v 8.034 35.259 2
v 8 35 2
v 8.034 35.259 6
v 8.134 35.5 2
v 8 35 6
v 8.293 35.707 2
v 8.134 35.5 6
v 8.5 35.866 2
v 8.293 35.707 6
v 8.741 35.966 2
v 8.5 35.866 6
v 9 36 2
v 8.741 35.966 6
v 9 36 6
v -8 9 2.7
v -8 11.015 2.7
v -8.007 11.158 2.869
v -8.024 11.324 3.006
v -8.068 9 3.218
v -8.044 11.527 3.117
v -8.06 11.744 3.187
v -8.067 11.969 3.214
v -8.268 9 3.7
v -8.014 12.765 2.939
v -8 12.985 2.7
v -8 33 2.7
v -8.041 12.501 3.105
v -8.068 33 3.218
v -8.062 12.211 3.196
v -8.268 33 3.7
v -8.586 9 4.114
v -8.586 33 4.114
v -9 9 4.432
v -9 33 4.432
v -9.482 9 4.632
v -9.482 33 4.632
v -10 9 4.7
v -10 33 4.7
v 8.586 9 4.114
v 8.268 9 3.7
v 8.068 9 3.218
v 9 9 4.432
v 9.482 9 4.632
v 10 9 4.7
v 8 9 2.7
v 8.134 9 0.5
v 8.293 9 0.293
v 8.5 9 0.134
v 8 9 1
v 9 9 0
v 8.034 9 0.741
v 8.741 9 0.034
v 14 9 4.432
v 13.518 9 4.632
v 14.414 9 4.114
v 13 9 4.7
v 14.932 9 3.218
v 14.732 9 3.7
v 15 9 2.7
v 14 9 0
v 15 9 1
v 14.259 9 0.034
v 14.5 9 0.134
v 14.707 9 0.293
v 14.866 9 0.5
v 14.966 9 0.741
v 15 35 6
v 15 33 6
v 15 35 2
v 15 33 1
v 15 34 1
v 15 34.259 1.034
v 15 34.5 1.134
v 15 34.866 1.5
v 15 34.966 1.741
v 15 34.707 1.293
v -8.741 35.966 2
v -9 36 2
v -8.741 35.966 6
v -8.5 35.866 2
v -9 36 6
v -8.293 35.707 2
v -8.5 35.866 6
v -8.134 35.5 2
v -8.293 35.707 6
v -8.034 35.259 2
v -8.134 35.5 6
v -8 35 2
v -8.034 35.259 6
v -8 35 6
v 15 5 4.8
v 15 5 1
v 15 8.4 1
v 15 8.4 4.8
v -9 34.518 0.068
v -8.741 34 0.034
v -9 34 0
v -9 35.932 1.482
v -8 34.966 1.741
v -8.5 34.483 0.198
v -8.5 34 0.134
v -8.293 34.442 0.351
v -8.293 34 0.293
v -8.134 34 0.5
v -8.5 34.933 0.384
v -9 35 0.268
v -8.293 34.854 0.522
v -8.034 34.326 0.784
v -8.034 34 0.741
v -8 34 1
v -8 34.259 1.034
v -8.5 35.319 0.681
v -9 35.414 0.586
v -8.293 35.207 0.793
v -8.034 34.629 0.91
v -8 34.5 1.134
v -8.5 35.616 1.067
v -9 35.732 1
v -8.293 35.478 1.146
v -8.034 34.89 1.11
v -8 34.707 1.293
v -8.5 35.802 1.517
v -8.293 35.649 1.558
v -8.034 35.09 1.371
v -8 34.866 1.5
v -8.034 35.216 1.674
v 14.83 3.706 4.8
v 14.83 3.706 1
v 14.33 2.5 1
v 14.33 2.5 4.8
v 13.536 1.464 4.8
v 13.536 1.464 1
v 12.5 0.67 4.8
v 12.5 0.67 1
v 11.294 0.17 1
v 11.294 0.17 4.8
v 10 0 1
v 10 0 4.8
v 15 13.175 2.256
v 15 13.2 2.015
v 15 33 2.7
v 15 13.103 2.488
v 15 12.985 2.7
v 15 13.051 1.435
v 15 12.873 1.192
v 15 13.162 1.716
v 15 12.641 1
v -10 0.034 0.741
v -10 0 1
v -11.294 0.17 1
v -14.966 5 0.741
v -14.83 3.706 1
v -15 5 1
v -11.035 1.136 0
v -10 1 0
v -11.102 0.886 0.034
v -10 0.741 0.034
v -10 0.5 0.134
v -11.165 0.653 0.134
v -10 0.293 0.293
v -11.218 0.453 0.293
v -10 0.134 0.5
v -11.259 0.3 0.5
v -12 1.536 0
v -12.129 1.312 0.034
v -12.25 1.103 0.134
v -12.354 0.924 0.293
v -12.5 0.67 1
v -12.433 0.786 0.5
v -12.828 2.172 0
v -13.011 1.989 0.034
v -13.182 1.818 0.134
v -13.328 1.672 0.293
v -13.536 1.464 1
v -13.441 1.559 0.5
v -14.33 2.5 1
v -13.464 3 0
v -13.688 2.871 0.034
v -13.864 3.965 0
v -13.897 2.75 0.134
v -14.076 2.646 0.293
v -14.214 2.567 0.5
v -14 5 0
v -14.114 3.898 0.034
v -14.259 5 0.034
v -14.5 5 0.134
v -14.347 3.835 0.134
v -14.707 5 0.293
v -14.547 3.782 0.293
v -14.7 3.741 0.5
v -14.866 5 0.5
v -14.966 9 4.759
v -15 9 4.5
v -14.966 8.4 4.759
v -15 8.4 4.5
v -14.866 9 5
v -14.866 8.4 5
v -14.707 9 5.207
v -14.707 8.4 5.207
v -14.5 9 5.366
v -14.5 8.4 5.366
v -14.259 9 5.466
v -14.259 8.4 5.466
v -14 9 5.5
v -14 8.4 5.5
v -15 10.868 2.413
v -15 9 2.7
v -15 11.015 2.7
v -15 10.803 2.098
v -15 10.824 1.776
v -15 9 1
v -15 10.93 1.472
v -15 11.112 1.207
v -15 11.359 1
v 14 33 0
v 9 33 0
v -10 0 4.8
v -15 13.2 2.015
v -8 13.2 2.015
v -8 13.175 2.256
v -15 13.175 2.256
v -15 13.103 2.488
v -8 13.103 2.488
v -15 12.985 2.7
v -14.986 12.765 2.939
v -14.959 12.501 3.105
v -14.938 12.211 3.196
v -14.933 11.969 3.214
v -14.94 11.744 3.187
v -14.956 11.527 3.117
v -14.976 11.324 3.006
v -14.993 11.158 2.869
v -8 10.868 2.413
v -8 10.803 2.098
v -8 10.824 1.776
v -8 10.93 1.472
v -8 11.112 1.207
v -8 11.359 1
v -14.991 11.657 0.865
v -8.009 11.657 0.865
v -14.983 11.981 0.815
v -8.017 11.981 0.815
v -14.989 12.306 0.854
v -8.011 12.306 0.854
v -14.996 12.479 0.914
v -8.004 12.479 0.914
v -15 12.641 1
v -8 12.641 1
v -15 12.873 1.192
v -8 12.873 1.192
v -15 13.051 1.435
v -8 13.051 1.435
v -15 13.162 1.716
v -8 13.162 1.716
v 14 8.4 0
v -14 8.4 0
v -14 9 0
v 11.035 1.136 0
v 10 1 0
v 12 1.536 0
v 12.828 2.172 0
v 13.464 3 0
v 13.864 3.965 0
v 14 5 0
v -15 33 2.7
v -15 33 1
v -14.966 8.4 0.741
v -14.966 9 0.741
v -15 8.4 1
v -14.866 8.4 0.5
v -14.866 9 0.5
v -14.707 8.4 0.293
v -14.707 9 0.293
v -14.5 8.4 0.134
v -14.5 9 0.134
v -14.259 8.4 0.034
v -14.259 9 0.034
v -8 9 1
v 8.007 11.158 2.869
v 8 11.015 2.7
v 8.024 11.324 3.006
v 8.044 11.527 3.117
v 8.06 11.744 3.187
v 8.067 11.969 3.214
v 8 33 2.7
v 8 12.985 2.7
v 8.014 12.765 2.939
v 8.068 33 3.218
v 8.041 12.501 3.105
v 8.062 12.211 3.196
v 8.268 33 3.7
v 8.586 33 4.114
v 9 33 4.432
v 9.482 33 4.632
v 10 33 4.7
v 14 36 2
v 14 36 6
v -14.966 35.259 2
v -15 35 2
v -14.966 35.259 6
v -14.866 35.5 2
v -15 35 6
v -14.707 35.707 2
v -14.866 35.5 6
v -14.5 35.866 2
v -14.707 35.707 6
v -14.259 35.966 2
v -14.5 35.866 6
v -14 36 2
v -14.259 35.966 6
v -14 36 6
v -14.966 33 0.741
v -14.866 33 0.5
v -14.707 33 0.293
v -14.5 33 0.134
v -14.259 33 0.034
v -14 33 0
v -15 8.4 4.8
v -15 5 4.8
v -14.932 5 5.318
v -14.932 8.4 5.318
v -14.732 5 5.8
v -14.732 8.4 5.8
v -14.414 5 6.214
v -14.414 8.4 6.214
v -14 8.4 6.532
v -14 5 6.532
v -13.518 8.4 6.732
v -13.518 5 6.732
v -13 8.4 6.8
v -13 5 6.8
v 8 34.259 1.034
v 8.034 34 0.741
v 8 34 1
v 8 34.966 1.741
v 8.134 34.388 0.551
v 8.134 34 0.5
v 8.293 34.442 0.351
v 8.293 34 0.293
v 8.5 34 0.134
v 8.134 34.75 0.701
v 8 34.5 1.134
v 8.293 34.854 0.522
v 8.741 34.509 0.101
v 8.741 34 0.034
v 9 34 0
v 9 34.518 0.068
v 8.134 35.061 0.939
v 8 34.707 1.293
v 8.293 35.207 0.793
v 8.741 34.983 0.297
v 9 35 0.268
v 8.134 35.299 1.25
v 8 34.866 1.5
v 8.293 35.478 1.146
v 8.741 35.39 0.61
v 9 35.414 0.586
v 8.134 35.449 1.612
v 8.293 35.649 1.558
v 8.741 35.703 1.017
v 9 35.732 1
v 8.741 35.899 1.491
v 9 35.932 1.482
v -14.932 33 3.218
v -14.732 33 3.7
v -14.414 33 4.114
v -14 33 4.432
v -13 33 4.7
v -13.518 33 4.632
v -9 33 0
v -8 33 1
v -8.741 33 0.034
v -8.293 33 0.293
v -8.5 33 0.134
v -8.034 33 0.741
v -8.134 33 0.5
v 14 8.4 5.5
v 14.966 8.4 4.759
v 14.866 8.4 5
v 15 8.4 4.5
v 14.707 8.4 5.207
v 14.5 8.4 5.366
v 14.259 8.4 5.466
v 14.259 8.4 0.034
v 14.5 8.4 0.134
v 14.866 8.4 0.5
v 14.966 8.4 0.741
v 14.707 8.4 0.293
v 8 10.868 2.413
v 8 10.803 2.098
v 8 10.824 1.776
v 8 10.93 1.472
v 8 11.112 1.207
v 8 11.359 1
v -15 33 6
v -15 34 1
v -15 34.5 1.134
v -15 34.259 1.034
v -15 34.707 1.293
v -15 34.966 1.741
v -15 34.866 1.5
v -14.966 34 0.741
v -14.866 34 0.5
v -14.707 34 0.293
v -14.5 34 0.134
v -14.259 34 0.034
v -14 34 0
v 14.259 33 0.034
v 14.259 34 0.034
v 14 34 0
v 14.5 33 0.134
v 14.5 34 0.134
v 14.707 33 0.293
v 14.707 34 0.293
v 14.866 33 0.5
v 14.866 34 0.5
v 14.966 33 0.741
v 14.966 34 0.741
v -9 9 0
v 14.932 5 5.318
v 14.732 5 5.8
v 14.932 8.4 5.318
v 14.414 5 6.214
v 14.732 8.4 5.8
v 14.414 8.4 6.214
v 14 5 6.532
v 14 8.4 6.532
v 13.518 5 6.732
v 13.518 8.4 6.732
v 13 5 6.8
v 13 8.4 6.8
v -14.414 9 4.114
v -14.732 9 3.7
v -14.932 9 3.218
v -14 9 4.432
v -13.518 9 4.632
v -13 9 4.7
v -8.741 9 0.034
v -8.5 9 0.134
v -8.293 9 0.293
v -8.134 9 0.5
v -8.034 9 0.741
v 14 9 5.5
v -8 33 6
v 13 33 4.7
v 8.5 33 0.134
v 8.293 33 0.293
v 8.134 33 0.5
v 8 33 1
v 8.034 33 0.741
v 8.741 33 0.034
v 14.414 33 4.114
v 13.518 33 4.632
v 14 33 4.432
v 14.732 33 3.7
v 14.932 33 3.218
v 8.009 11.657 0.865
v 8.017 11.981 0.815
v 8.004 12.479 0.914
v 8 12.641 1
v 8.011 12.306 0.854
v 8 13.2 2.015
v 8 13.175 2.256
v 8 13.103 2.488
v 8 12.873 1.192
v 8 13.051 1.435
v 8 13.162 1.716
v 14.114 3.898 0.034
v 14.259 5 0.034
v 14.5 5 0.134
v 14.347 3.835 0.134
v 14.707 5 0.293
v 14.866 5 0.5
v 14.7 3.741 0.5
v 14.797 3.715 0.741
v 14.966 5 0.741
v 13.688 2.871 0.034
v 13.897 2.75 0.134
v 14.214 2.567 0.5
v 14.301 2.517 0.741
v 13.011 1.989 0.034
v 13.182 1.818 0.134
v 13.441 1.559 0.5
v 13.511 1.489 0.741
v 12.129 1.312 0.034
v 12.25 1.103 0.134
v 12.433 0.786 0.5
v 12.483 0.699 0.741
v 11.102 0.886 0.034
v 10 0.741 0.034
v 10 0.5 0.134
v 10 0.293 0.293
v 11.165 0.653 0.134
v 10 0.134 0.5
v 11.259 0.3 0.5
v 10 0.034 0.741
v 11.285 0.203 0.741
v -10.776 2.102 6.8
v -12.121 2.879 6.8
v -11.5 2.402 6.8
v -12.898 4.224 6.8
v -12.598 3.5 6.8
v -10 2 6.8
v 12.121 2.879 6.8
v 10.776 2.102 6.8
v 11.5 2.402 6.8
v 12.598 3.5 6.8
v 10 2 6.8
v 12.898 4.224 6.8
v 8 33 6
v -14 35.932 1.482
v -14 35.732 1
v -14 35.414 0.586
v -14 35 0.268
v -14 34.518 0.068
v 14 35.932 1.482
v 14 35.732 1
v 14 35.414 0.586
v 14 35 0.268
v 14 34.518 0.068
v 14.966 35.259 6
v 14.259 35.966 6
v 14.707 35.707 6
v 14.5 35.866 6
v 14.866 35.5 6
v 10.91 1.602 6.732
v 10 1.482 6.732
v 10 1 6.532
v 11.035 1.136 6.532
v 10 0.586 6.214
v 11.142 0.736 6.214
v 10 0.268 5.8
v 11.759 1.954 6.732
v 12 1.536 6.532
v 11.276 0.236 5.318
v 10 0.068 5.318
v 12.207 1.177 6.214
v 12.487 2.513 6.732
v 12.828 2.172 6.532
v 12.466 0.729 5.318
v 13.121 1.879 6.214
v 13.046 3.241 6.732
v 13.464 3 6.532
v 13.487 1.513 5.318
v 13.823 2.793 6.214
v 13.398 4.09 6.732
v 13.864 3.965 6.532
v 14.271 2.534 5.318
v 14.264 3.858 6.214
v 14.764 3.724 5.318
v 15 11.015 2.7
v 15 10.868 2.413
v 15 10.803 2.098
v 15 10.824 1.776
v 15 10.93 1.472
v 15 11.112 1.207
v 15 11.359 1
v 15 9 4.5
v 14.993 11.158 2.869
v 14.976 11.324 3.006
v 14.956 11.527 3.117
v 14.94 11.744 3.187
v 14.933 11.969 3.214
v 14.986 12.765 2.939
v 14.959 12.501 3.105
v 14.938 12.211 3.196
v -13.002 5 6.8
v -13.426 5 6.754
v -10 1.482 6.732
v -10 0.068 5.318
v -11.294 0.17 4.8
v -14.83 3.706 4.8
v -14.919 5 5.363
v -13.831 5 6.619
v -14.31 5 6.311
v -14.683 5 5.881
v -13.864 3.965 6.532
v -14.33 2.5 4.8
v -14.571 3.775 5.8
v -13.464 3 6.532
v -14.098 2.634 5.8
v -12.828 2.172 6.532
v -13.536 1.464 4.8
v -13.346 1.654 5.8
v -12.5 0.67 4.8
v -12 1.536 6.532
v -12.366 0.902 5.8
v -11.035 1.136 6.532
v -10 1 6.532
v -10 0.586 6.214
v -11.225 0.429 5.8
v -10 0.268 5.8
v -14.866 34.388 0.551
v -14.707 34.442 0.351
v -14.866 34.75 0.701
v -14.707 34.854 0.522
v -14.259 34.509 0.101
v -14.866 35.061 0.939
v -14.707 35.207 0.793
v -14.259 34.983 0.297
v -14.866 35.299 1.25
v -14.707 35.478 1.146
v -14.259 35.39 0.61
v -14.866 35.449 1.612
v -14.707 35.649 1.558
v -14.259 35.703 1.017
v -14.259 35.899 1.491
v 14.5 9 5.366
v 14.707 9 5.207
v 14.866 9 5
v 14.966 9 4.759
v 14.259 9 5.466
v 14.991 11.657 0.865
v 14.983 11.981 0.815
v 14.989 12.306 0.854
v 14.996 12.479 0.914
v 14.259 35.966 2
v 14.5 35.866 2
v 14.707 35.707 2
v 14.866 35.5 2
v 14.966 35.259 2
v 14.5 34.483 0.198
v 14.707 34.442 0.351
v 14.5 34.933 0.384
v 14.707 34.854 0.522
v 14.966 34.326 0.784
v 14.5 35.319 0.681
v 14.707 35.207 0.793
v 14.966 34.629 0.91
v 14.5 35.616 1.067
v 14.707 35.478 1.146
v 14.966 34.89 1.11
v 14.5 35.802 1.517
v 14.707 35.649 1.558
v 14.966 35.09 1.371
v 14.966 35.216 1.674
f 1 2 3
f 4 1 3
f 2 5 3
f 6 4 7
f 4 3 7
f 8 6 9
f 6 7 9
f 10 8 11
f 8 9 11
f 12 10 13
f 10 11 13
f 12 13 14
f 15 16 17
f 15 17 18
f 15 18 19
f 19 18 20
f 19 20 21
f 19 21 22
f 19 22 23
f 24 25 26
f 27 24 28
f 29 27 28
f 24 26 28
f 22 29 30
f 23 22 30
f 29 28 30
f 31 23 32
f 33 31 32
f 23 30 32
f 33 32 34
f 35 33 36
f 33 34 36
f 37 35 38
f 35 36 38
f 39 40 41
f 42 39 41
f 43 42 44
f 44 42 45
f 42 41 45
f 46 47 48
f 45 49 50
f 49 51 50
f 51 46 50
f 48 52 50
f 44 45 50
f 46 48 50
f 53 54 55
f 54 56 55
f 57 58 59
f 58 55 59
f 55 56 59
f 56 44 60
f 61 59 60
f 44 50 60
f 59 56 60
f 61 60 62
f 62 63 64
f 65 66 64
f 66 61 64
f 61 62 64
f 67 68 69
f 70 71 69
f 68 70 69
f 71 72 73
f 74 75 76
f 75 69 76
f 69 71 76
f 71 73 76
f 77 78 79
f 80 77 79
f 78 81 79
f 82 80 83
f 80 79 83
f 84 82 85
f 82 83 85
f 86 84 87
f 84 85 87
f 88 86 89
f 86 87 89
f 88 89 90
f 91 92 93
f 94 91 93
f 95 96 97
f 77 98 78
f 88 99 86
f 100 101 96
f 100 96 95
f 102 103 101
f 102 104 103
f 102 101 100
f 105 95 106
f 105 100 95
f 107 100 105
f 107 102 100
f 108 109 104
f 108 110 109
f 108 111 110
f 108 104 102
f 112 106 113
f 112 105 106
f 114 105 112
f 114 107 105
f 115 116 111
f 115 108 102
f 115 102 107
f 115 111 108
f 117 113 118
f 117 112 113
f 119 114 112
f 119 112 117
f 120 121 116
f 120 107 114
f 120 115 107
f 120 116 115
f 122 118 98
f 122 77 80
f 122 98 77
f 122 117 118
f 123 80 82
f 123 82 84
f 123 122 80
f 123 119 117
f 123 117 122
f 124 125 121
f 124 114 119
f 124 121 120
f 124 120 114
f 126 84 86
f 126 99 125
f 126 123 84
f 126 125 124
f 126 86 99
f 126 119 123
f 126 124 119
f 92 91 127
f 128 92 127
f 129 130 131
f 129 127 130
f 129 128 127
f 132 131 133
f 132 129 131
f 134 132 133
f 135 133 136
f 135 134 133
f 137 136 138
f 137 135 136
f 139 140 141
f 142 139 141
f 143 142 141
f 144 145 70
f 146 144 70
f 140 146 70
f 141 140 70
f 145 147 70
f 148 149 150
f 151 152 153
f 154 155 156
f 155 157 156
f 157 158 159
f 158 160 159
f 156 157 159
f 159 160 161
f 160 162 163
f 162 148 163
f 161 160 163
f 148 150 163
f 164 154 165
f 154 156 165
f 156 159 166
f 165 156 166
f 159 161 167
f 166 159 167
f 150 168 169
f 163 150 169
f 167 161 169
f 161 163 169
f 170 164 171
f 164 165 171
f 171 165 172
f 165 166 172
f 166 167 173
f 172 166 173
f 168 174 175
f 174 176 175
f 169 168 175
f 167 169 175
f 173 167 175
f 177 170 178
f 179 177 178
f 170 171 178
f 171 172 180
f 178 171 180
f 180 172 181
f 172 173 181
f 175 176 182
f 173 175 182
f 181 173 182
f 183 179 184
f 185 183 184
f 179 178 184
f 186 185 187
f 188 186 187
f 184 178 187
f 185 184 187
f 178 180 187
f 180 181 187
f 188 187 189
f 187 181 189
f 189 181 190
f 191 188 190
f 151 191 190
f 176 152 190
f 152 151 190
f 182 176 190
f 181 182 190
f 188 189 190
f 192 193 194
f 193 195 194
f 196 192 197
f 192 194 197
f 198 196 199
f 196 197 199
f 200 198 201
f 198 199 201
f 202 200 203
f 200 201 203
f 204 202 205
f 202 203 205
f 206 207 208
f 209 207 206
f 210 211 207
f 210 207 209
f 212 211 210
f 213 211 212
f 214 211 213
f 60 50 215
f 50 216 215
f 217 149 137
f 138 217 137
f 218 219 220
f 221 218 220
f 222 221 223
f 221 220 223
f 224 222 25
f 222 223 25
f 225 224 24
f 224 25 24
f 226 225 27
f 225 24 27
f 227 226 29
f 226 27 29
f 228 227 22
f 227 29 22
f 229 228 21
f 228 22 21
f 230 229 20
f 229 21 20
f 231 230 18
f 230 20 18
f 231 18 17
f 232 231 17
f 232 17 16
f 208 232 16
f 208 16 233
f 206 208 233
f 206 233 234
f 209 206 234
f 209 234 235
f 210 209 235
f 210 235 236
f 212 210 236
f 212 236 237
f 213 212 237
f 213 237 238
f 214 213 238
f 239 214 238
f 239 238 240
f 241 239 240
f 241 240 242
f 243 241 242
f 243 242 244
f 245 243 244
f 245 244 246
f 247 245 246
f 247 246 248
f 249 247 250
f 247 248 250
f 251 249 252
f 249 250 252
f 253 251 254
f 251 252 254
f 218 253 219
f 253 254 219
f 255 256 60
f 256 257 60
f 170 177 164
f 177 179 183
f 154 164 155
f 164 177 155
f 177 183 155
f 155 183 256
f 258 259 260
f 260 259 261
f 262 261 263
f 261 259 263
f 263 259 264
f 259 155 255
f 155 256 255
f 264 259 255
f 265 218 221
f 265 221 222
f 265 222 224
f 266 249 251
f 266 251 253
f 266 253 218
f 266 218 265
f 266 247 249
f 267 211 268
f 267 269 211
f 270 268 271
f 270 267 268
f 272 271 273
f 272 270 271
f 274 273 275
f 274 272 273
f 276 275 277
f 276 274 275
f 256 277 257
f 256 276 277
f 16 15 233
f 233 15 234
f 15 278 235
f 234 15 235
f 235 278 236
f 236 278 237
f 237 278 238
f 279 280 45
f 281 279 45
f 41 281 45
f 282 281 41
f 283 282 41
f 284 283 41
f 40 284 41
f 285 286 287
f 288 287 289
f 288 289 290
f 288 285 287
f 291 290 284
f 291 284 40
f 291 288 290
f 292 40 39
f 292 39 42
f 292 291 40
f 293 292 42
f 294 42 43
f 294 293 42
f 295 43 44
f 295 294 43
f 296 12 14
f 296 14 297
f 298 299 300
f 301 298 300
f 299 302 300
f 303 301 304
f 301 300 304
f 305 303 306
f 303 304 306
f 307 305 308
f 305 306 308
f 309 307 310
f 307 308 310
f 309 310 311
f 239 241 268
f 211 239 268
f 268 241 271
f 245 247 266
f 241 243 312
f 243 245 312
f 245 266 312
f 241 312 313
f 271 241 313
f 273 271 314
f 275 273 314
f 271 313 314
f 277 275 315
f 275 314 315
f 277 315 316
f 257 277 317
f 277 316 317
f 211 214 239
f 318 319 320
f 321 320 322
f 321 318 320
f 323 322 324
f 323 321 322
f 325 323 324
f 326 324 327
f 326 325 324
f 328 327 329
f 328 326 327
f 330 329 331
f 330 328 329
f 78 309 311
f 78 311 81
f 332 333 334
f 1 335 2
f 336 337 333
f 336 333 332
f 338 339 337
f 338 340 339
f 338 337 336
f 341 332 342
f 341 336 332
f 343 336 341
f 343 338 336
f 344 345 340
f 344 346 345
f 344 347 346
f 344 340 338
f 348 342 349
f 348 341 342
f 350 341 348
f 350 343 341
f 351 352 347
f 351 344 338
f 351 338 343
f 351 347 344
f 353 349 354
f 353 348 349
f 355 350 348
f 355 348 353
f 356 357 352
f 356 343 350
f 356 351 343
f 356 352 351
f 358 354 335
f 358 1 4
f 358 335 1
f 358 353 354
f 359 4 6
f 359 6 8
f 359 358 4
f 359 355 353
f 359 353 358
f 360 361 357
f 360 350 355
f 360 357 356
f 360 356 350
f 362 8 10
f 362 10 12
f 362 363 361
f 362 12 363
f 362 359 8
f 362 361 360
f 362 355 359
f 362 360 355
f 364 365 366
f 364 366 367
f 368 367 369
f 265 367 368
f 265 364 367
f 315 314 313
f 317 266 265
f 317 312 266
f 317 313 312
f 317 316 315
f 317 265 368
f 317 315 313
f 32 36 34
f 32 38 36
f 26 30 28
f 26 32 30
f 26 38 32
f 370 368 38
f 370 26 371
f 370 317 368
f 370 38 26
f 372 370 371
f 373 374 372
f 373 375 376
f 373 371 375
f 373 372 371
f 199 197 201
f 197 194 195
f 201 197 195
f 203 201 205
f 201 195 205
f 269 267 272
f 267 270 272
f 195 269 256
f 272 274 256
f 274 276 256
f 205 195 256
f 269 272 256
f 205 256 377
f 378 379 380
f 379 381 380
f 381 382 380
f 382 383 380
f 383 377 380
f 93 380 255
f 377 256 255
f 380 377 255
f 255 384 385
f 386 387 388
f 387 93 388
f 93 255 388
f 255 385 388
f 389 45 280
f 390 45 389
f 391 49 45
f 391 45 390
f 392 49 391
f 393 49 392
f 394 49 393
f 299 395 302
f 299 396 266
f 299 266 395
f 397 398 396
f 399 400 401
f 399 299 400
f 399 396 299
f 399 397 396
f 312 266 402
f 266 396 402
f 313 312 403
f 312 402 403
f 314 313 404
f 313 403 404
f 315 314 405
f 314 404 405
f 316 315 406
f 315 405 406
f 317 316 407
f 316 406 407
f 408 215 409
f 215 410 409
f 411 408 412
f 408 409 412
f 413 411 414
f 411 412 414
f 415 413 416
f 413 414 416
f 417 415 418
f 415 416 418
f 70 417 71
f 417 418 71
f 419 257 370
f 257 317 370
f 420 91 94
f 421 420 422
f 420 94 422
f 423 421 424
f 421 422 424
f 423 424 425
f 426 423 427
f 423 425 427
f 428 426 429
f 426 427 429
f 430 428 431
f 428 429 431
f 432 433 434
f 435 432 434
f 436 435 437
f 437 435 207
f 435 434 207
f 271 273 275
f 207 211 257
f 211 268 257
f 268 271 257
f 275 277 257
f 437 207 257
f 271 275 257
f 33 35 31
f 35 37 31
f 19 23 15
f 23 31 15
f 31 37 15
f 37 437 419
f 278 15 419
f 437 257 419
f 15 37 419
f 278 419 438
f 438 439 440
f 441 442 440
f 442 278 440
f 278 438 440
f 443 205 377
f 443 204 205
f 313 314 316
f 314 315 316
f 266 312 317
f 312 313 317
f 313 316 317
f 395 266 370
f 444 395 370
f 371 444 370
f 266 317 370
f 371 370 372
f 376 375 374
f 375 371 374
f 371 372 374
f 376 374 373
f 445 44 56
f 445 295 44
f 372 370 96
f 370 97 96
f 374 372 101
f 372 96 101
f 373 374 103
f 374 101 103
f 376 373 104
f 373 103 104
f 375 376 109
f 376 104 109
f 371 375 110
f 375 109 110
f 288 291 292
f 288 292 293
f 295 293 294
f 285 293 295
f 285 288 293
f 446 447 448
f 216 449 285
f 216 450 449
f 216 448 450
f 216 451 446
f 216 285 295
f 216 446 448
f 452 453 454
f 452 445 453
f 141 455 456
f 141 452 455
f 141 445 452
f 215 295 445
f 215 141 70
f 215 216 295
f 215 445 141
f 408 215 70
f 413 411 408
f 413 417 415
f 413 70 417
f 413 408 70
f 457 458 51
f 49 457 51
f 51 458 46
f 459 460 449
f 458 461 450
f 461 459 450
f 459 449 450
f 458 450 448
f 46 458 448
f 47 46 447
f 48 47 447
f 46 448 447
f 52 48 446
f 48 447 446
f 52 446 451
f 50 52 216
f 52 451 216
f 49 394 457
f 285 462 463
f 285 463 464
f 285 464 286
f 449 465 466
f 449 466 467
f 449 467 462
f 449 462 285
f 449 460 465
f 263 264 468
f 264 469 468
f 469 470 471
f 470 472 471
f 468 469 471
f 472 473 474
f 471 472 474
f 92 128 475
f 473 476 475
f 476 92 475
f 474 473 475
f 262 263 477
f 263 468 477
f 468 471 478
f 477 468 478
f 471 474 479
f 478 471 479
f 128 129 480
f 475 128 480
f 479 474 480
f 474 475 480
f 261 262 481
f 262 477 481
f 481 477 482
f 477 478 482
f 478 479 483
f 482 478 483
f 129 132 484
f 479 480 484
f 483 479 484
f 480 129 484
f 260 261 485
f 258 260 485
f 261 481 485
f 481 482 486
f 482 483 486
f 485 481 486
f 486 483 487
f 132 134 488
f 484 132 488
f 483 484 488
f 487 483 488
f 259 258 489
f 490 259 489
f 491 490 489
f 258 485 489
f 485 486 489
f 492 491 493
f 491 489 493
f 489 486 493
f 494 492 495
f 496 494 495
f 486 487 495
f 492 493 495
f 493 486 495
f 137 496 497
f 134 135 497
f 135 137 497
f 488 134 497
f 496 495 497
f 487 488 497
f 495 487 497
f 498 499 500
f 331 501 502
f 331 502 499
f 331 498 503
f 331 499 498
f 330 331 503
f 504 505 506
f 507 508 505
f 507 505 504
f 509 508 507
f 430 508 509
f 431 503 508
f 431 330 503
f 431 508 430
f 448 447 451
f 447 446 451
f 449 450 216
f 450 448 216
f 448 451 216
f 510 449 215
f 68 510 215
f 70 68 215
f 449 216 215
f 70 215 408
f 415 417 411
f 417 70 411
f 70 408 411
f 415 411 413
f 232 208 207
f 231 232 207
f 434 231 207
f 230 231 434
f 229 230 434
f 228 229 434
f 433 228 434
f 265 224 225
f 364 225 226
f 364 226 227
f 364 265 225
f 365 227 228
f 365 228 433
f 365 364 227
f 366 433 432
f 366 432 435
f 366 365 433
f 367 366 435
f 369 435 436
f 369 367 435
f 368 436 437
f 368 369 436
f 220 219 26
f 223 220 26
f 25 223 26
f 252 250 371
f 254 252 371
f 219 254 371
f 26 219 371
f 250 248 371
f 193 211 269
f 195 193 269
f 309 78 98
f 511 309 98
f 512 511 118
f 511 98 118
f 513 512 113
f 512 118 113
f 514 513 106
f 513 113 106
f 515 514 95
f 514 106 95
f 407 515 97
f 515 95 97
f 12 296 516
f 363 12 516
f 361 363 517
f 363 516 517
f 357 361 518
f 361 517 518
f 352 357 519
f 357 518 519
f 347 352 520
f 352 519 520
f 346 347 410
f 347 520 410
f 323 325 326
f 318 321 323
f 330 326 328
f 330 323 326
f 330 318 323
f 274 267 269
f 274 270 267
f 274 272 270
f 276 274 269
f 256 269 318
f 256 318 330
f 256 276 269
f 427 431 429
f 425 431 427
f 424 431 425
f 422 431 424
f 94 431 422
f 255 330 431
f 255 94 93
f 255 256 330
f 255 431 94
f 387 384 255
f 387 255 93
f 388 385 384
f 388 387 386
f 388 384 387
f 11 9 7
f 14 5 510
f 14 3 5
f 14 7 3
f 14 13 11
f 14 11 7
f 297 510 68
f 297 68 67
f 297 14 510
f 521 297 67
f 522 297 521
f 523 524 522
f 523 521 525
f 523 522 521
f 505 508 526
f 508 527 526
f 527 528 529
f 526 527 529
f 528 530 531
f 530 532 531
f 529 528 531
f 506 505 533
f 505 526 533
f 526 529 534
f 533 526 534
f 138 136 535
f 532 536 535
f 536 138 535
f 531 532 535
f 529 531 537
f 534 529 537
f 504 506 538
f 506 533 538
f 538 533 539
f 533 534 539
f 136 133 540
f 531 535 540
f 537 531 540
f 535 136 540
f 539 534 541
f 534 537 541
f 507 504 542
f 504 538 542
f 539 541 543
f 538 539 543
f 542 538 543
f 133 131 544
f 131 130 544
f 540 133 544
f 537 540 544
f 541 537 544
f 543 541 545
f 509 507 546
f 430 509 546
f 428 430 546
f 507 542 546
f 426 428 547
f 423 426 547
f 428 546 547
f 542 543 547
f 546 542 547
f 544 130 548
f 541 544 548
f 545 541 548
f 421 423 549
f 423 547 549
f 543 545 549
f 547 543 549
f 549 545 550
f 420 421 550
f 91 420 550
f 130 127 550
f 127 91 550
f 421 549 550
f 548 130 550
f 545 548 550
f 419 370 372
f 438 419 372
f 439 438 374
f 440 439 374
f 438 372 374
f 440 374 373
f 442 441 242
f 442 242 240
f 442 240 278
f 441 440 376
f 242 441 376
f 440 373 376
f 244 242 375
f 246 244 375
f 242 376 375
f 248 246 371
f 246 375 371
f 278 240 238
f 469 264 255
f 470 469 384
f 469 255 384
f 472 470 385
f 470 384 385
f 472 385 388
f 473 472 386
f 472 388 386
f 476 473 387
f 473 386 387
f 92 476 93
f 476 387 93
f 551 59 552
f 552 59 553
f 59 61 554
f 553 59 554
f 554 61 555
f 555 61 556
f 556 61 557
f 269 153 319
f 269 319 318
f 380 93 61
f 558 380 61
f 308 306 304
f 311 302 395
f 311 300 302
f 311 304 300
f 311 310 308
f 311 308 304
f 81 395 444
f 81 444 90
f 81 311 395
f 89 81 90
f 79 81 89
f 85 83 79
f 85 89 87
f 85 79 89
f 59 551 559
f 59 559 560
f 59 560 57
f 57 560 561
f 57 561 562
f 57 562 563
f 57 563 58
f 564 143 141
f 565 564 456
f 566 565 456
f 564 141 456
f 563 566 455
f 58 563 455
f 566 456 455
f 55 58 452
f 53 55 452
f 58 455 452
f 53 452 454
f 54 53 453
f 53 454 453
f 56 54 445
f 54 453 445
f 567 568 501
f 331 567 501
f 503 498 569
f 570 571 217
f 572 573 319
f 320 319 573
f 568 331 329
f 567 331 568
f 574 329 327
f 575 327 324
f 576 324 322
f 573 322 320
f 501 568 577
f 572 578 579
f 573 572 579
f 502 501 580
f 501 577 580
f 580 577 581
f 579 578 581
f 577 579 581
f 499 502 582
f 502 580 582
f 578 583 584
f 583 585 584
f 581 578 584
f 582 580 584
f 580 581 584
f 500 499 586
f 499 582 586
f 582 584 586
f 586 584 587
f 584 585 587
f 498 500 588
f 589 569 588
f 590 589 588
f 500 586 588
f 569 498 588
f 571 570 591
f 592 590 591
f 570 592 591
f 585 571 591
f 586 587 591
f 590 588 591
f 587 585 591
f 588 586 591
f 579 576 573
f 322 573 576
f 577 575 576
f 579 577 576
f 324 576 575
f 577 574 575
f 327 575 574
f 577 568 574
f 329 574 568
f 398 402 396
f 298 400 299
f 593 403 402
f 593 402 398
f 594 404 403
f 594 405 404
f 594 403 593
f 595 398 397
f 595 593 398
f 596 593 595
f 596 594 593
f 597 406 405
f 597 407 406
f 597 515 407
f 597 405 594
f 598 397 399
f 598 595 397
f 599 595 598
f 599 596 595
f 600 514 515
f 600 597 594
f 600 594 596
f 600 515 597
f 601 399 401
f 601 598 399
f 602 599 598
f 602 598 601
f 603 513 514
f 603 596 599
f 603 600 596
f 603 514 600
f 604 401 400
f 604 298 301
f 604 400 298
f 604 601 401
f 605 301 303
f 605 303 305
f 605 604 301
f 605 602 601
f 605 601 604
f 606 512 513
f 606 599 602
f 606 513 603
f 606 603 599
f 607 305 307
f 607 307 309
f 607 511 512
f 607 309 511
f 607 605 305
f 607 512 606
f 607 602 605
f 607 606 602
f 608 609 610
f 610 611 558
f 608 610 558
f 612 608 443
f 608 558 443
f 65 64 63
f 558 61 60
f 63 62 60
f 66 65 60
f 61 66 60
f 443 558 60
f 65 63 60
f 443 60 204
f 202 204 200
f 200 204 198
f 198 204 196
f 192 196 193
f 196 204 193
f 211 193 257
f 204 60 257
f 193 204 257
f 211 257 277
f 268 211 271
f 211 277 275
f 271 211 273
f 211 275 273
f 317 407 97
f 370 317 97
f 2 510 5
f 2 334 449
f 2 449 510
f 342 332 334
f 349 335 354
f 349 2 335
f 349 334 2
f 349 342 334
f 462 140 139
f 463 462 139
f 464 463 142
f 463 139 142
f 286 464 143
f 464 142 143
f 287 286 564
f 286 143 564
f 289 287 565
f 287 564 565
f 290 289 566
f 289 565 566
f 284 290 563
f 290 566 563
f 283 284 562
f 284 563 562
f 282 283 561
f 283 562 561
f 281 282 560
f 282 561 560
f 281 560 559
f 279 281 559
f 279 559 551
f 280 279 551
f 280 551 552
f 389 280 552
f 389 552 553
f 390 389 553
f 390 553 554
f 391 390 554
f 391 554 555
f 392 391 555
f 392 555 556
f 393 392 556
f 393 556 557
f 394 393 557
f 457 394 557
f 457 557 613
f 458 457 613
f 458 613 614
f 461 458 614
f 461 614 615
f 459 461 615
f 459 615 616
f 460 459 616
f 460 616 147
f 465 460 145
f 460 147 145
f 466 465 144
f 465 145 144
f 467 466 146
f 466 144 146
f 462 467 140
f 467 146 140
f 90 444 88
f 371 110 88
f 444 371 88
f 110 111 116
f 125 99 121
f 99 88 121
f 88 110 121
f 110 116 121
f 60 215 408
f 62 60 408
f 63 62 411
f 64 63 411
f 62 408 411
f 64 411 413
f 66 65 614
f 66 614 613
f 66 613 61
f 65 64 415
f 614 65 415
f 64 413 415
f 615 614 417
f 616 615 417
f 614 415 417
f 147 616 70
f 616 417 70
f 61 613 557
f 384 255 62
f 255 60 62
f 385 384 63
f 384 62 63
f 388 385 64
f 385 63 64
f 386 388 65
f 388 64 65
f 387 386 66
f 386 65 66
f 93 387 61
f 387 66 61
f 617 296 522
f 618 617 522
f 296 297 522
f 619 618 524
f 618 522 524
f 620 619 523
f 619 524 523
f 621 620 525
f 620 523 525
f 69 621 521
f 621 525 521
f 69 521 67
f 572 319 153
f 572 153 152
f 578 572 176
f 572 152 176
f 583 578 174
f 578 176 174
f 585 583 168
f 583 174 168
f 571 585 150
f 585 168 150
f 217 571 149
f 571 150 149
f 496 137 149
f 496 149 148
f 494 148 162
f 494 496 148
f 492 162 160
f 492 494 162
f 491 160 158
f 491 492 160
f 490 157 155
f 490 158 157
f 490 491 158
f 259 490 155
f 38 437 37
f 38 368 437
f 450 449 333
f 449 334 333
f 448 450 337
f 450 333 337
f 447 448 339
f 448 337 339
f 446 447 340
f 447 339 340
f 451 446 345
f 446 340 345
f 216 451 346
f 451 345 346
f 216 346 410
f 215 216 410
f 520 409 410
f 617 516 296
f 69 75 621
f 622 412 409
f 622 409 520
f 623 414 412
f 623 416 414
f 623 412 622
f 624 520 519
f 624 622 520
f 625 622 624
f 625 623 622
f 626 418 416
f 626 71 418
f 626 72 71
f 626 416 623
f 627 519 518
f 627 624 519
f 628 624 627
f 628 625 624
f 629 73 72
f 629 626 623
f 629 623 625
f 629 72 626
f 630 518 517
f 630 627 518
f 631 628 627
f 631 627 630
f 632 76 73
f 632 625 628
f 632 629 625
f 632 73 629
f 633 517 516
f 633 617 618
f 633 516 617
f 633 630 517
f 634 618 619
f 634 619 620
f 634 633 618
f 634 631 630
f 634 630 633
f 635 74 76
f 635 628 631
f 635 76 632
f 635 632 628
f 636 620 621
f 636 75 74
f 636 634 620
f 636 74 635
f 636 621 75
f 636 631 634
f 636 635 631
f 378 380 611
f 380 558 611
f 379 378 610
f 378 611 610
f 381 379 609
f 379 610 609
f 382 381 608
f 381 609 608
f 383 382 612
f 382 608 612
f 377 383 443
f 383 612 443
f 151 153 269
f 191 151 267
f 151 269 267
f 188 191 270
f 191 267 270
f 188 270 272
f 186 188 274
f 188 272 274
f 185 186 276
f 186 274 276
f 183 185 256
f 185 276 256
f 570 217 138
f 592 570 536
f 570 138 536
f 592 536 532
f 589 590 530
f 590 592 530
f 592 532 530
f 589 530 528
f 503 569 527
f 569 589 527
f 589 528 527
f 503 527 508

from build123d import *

# Parameters (mm, degrees)
F0_W         = 30
F0_H         = 8.4
F1_DEPTH     = 6.8
F0_W_2       = 7
F0_H_2       = 24
F2_DEPTH     = 4.7
F0_H_3       = 3
F3_DEPTH     = 6
F4_DEPTH     = 5.5
F5_R         = 2
F5_2_R       = 2
F5_3_R       = 2
F5_4_R       = 2
F5_5_R       = 2
F6_R         = 1
F7_R         = 1
F7_2_R       = 1
F7_3_R       = 1
F7_4_R       = 1
F7_5_R       = 1
F7_6_R       = 1
F8_T1_DEPTH  = 6.8
F8_T4_ANGLE  = 90
F8_T6_ANGLE  = 90
F8_T8_ANGLE  = 90
F8_T10_ANGLE = 90
F9_R         = 1.2
F10_DEPTH    = 55.5


# Not quite as in the source:
# - a fillet or chamfer that OpenCascade refuses, or shapes differently, is made with other operations: its cross-section is extruded or revolved along the edge and cut away or added


with BuildPart() as f1:
    # F0 (on Top) → F1 (new body)
    with BuildSketch(Plane.XY):
        with Locations((0, 4.2)):
            Rectangle(F0_W, F0_H)
    extrude(amount=F1_DEPTH)

    # F5#3
    f5_3_edges = [f1.edges().sort_by_distance(p)[0] for p in [
        (15, 4.2, 6.8),
        (-15, 4.2, 6.8),
        (0, 0, 6.8),
    ]]
    fillet(f5_3_edges, radius=F5_3_R)

    # F7#4
    f7_4_edges = [f1.edges().sort_by_distance(p)[0] for p in [
        (15, 4.2, 0),
        (0, 0, 0),
        (-15, 4.2, 0),
    ]]
    fillet(f7_4_edges, radius=F7_4_R)

    # F8: fillet of radius 5 on 2 edges, made by hand

    # F8_s2 → F8_t1 (cut)
    with BuildSketch(Plane.XY):
        with BuildLine():
            ThreePointArc((15, 5), (13.5355339059, 1.4644660941), (10, 0))
            Line((10, 0), (15, 0))
            Line((15, 0), (15, 5))
        make_face()
        with BuildLine():
            ThreePointArc((-15, 5), (-13.5355339059, 1.4644660941), (-10, 0))
            Line((-10, 0), (-15, 0))
            Line((-15, 0), (-15, 5))
        make_face()
    extrude(amount=F8_T1_DEPTH, mode=Mode.SUBTRACT)

    # F8_s3 → F8_t4 (revolve, cut)
    with BuildSketch(Plane.YZ.offset(-10)):
        with BuildLine():
            ThreePointArc((1, 0), (0.2928932188, 0.2928932188), (0, 1))
            Line((0, 1), (0, 0))
            Line((0, 0), (1, 0))
        make_face()
    revolve(axis=Axis((-10, 5, 0), (0, 0, -1)), revolution_arc=F8_T4_ANGLE, mode=Mode.SUBTRACT)

    # F8_s5 → F8_t6 (revolve, cut)
    with BuildSketch(Plane.XZ.offset(-5)):
        with BuildLine():
            ThreePointArc((-13, 6.8), (-14.4142135624, 6.2142135624), (-15, 4.8))
            Line((-15, 4.8), (-15, 6.8))
            Line((-15, 6.8), (-13, 6.8))
        make_face()
    revolve(axis=Axis((-10, 5, 6.8), (0, 0, 1)), revolution_arc=F8_T6_ANGLE, mode=Mode.SUBTRACT)

    # F8_s7 → F8_t8 (revolve, cut)
    with BuildSketch(Plane.XZ.offset(-5)):
        with BuildLine():
            ThreePointArc((14, 0), (14.7071067812, 0.2928932188), (15, 1))
            Line((15, 1), (15, 0))
            Line((15, 0), (14, 0))
        make_face()
    revolve(axis=Axis((10, 5, 0), (0, 0, -1)), revolution_arc=F8_T8_ANGLE, mode=Mode.SUBTRACT)

    # F8_s9 → F8_t10 (revolve, cut)
    with BuildSketch(Plane.YZ.offset(10)):
        with BuildLine():
            ThreePointArc((2, 6.8), (0.5857864376, 6.2142135624), (0, 4.8))
            Line((0, 4.8), (0, 6.8))
            Line((0, 6.8), (2, 6.8))
        make_face()
    revolve(axis=Axis((10, 5, 6.8), (0, 0, 1)), revolution_arc=F8_T10_ANGLE, mode=Mode.SUBTRACT)


with BuildPart() as f2:
    # F0 (on Top) → F2 (new body)
    with BuildSketch(Plane.XY):
        with Locations((-11.5, 21)):
            Rectangle(F0_W_2, F0_H_2)
    extrude(amount=F2_DEPTH)

    # F5#4
    f5_4_edges = [f2.edges().sort_by_distance(p)[0] for p in [
        (-15, 21, 4.7),
        (-8, 21, 4.7),
    ]]
    fillet(f5_4_edges, radius=F5_4_R)

    # F7#5
    f7_5_edges = [f2.edges().sort_by_distance(p)[0] for p in [
        (-8, 21, 0),
        (-15, 21, 0),
    ]]
    fillet(f7_5_edges, radius=F7_5_R)


with BuildPart() as f2b:
    # F0 (on Top) → F2, piece 2 (new body)
    with BuildSketch(Plane.XY):
        with Locations((11.5, 21)):
            Rectangle(F0_W_2, F0_H_2)
    extrude(amount=F2_DEPTH)

    # F5#5
    f5_5_edges = [f2b.edges().sort_by_distance(p)[0] for p in [
        (8, 21, 4.7),
        (15, 21, 4.7),
    ]]
    fillet(f5_5_edges, radius=F5_5_R)

    # F7#2
    f7_2_edges = [f2b.edges().sort_by_distance(p)[0] for p in [
        (15, 21, 0),
        (8, 21, 0),
    ]]
    fillet(f7_2_edges, radius=F7_2_R)


with BuildPart() as f3:
    # F0 (on Top) → F3 (new body)
    with BuildSketch(Plane.XY):
        with Locations((-11.5, 34.5)):
            Rectangle(F0_W_2, F0_H_3)
    extrude(amount=F3_DEPTH)

    # F5#2
    f5_2_edges = [f3.edges().sort_by_distance(p)[0] for p in [
        (-11.5, 36, 0),
    ]]
    fillet(f5_2_edges, radius=F5_2_R)

    # F7#6
    f7_6_edges = [f3.edges().sort_by_distance(p)[0] for p in [
        (-15, 33.5, 0),
        (-15, 35.414214, 0.585786),
        (-8, 33.5, 0),
        (-8, 35.414214, 0.585786),
        (-15, 36, 4),
        (-8, 36, 4),
    ]]
    fillet(f7_6_edges, radius=F7_6_R)


with BuildPart() as f3b:
    # F0 (on Top) → F3, piece 2 (new body)
    with BuildSketch(Plane.XY):
        with Locations((11.5, 34.5)):
            Rectangle(F0_W_2, F0_H_3)
    extrude(amount=F3_DEPTH)

    # F5
    f5_edges = [f3b.edges().sort_by_distance(p)[0] for p in [
        (11.5, 36, 0),
    ]]
    fillet(f5_edges, radius=F5_R)

    # F7
    f7_edges = [f3b.edges().sort_by_distance(p)[0] for p in [
        (15, 33.5, 0),
        (15, 35.414214, 0.585786),
        (8, 33.5, 0),
        (8, 35.414214, 0.585786),
        (8, 36, 4),
        (15, 36, 4),
    ]]
    fillet(f7_edges, radius=F7_R)


with BuildPart() as f4:
    # F0 (on Top) → F4 (new body)
    with BuildSketch(Plane.XY):
        Polygon((-8, 9), (-15, 9), (-15, 8.4), (15, 8.4), (15, 9), (8, 9), align=None)
    extrude(amount=F4_DEPTH)

    # F6
    f6_edges = [f4.edges().sort_by_distance(p)[0] for p in [
        (15, 8.7, 5.5),
        (-15, 8.7, 5.5),
    ]]
    fillet(f6_edges, radius=F6_R)

    # F7#3
    f7_3_edges = [f4.edges().sort_by_distance(p)[0] for p in [
        (15, 8.7, 0),
        (-15, 8.7, 0),
    ]]
    fillet(f7_3_edges, radius=F7_3_R)


with BuildPart() as f10_tool:
    # F9 (on Right) → F10 (new body, symmetric)
    with BuildSketch(Plane.YZ):
        with Locations((12, 2.0145524759)):
            Circle(F9_R)
    extrude(amount=F10_DEPTH, both=True)


with BuildPart() as f2_1:
    add(f2.part)

    # F10: cut by f10_tool
    add(f10_tool.part, mode=Mode.SUBTRACT)


with BuildPart() as f2b_1:
    add(f2b.part)

    # F10: cut by f10_tool
    add(f10_tool.part, mode=Mode.SUBTRACT)


solid = Compound([f1.part, f3.part, f3b.part, f4.part, f2_1.part, f2b_1.part])
